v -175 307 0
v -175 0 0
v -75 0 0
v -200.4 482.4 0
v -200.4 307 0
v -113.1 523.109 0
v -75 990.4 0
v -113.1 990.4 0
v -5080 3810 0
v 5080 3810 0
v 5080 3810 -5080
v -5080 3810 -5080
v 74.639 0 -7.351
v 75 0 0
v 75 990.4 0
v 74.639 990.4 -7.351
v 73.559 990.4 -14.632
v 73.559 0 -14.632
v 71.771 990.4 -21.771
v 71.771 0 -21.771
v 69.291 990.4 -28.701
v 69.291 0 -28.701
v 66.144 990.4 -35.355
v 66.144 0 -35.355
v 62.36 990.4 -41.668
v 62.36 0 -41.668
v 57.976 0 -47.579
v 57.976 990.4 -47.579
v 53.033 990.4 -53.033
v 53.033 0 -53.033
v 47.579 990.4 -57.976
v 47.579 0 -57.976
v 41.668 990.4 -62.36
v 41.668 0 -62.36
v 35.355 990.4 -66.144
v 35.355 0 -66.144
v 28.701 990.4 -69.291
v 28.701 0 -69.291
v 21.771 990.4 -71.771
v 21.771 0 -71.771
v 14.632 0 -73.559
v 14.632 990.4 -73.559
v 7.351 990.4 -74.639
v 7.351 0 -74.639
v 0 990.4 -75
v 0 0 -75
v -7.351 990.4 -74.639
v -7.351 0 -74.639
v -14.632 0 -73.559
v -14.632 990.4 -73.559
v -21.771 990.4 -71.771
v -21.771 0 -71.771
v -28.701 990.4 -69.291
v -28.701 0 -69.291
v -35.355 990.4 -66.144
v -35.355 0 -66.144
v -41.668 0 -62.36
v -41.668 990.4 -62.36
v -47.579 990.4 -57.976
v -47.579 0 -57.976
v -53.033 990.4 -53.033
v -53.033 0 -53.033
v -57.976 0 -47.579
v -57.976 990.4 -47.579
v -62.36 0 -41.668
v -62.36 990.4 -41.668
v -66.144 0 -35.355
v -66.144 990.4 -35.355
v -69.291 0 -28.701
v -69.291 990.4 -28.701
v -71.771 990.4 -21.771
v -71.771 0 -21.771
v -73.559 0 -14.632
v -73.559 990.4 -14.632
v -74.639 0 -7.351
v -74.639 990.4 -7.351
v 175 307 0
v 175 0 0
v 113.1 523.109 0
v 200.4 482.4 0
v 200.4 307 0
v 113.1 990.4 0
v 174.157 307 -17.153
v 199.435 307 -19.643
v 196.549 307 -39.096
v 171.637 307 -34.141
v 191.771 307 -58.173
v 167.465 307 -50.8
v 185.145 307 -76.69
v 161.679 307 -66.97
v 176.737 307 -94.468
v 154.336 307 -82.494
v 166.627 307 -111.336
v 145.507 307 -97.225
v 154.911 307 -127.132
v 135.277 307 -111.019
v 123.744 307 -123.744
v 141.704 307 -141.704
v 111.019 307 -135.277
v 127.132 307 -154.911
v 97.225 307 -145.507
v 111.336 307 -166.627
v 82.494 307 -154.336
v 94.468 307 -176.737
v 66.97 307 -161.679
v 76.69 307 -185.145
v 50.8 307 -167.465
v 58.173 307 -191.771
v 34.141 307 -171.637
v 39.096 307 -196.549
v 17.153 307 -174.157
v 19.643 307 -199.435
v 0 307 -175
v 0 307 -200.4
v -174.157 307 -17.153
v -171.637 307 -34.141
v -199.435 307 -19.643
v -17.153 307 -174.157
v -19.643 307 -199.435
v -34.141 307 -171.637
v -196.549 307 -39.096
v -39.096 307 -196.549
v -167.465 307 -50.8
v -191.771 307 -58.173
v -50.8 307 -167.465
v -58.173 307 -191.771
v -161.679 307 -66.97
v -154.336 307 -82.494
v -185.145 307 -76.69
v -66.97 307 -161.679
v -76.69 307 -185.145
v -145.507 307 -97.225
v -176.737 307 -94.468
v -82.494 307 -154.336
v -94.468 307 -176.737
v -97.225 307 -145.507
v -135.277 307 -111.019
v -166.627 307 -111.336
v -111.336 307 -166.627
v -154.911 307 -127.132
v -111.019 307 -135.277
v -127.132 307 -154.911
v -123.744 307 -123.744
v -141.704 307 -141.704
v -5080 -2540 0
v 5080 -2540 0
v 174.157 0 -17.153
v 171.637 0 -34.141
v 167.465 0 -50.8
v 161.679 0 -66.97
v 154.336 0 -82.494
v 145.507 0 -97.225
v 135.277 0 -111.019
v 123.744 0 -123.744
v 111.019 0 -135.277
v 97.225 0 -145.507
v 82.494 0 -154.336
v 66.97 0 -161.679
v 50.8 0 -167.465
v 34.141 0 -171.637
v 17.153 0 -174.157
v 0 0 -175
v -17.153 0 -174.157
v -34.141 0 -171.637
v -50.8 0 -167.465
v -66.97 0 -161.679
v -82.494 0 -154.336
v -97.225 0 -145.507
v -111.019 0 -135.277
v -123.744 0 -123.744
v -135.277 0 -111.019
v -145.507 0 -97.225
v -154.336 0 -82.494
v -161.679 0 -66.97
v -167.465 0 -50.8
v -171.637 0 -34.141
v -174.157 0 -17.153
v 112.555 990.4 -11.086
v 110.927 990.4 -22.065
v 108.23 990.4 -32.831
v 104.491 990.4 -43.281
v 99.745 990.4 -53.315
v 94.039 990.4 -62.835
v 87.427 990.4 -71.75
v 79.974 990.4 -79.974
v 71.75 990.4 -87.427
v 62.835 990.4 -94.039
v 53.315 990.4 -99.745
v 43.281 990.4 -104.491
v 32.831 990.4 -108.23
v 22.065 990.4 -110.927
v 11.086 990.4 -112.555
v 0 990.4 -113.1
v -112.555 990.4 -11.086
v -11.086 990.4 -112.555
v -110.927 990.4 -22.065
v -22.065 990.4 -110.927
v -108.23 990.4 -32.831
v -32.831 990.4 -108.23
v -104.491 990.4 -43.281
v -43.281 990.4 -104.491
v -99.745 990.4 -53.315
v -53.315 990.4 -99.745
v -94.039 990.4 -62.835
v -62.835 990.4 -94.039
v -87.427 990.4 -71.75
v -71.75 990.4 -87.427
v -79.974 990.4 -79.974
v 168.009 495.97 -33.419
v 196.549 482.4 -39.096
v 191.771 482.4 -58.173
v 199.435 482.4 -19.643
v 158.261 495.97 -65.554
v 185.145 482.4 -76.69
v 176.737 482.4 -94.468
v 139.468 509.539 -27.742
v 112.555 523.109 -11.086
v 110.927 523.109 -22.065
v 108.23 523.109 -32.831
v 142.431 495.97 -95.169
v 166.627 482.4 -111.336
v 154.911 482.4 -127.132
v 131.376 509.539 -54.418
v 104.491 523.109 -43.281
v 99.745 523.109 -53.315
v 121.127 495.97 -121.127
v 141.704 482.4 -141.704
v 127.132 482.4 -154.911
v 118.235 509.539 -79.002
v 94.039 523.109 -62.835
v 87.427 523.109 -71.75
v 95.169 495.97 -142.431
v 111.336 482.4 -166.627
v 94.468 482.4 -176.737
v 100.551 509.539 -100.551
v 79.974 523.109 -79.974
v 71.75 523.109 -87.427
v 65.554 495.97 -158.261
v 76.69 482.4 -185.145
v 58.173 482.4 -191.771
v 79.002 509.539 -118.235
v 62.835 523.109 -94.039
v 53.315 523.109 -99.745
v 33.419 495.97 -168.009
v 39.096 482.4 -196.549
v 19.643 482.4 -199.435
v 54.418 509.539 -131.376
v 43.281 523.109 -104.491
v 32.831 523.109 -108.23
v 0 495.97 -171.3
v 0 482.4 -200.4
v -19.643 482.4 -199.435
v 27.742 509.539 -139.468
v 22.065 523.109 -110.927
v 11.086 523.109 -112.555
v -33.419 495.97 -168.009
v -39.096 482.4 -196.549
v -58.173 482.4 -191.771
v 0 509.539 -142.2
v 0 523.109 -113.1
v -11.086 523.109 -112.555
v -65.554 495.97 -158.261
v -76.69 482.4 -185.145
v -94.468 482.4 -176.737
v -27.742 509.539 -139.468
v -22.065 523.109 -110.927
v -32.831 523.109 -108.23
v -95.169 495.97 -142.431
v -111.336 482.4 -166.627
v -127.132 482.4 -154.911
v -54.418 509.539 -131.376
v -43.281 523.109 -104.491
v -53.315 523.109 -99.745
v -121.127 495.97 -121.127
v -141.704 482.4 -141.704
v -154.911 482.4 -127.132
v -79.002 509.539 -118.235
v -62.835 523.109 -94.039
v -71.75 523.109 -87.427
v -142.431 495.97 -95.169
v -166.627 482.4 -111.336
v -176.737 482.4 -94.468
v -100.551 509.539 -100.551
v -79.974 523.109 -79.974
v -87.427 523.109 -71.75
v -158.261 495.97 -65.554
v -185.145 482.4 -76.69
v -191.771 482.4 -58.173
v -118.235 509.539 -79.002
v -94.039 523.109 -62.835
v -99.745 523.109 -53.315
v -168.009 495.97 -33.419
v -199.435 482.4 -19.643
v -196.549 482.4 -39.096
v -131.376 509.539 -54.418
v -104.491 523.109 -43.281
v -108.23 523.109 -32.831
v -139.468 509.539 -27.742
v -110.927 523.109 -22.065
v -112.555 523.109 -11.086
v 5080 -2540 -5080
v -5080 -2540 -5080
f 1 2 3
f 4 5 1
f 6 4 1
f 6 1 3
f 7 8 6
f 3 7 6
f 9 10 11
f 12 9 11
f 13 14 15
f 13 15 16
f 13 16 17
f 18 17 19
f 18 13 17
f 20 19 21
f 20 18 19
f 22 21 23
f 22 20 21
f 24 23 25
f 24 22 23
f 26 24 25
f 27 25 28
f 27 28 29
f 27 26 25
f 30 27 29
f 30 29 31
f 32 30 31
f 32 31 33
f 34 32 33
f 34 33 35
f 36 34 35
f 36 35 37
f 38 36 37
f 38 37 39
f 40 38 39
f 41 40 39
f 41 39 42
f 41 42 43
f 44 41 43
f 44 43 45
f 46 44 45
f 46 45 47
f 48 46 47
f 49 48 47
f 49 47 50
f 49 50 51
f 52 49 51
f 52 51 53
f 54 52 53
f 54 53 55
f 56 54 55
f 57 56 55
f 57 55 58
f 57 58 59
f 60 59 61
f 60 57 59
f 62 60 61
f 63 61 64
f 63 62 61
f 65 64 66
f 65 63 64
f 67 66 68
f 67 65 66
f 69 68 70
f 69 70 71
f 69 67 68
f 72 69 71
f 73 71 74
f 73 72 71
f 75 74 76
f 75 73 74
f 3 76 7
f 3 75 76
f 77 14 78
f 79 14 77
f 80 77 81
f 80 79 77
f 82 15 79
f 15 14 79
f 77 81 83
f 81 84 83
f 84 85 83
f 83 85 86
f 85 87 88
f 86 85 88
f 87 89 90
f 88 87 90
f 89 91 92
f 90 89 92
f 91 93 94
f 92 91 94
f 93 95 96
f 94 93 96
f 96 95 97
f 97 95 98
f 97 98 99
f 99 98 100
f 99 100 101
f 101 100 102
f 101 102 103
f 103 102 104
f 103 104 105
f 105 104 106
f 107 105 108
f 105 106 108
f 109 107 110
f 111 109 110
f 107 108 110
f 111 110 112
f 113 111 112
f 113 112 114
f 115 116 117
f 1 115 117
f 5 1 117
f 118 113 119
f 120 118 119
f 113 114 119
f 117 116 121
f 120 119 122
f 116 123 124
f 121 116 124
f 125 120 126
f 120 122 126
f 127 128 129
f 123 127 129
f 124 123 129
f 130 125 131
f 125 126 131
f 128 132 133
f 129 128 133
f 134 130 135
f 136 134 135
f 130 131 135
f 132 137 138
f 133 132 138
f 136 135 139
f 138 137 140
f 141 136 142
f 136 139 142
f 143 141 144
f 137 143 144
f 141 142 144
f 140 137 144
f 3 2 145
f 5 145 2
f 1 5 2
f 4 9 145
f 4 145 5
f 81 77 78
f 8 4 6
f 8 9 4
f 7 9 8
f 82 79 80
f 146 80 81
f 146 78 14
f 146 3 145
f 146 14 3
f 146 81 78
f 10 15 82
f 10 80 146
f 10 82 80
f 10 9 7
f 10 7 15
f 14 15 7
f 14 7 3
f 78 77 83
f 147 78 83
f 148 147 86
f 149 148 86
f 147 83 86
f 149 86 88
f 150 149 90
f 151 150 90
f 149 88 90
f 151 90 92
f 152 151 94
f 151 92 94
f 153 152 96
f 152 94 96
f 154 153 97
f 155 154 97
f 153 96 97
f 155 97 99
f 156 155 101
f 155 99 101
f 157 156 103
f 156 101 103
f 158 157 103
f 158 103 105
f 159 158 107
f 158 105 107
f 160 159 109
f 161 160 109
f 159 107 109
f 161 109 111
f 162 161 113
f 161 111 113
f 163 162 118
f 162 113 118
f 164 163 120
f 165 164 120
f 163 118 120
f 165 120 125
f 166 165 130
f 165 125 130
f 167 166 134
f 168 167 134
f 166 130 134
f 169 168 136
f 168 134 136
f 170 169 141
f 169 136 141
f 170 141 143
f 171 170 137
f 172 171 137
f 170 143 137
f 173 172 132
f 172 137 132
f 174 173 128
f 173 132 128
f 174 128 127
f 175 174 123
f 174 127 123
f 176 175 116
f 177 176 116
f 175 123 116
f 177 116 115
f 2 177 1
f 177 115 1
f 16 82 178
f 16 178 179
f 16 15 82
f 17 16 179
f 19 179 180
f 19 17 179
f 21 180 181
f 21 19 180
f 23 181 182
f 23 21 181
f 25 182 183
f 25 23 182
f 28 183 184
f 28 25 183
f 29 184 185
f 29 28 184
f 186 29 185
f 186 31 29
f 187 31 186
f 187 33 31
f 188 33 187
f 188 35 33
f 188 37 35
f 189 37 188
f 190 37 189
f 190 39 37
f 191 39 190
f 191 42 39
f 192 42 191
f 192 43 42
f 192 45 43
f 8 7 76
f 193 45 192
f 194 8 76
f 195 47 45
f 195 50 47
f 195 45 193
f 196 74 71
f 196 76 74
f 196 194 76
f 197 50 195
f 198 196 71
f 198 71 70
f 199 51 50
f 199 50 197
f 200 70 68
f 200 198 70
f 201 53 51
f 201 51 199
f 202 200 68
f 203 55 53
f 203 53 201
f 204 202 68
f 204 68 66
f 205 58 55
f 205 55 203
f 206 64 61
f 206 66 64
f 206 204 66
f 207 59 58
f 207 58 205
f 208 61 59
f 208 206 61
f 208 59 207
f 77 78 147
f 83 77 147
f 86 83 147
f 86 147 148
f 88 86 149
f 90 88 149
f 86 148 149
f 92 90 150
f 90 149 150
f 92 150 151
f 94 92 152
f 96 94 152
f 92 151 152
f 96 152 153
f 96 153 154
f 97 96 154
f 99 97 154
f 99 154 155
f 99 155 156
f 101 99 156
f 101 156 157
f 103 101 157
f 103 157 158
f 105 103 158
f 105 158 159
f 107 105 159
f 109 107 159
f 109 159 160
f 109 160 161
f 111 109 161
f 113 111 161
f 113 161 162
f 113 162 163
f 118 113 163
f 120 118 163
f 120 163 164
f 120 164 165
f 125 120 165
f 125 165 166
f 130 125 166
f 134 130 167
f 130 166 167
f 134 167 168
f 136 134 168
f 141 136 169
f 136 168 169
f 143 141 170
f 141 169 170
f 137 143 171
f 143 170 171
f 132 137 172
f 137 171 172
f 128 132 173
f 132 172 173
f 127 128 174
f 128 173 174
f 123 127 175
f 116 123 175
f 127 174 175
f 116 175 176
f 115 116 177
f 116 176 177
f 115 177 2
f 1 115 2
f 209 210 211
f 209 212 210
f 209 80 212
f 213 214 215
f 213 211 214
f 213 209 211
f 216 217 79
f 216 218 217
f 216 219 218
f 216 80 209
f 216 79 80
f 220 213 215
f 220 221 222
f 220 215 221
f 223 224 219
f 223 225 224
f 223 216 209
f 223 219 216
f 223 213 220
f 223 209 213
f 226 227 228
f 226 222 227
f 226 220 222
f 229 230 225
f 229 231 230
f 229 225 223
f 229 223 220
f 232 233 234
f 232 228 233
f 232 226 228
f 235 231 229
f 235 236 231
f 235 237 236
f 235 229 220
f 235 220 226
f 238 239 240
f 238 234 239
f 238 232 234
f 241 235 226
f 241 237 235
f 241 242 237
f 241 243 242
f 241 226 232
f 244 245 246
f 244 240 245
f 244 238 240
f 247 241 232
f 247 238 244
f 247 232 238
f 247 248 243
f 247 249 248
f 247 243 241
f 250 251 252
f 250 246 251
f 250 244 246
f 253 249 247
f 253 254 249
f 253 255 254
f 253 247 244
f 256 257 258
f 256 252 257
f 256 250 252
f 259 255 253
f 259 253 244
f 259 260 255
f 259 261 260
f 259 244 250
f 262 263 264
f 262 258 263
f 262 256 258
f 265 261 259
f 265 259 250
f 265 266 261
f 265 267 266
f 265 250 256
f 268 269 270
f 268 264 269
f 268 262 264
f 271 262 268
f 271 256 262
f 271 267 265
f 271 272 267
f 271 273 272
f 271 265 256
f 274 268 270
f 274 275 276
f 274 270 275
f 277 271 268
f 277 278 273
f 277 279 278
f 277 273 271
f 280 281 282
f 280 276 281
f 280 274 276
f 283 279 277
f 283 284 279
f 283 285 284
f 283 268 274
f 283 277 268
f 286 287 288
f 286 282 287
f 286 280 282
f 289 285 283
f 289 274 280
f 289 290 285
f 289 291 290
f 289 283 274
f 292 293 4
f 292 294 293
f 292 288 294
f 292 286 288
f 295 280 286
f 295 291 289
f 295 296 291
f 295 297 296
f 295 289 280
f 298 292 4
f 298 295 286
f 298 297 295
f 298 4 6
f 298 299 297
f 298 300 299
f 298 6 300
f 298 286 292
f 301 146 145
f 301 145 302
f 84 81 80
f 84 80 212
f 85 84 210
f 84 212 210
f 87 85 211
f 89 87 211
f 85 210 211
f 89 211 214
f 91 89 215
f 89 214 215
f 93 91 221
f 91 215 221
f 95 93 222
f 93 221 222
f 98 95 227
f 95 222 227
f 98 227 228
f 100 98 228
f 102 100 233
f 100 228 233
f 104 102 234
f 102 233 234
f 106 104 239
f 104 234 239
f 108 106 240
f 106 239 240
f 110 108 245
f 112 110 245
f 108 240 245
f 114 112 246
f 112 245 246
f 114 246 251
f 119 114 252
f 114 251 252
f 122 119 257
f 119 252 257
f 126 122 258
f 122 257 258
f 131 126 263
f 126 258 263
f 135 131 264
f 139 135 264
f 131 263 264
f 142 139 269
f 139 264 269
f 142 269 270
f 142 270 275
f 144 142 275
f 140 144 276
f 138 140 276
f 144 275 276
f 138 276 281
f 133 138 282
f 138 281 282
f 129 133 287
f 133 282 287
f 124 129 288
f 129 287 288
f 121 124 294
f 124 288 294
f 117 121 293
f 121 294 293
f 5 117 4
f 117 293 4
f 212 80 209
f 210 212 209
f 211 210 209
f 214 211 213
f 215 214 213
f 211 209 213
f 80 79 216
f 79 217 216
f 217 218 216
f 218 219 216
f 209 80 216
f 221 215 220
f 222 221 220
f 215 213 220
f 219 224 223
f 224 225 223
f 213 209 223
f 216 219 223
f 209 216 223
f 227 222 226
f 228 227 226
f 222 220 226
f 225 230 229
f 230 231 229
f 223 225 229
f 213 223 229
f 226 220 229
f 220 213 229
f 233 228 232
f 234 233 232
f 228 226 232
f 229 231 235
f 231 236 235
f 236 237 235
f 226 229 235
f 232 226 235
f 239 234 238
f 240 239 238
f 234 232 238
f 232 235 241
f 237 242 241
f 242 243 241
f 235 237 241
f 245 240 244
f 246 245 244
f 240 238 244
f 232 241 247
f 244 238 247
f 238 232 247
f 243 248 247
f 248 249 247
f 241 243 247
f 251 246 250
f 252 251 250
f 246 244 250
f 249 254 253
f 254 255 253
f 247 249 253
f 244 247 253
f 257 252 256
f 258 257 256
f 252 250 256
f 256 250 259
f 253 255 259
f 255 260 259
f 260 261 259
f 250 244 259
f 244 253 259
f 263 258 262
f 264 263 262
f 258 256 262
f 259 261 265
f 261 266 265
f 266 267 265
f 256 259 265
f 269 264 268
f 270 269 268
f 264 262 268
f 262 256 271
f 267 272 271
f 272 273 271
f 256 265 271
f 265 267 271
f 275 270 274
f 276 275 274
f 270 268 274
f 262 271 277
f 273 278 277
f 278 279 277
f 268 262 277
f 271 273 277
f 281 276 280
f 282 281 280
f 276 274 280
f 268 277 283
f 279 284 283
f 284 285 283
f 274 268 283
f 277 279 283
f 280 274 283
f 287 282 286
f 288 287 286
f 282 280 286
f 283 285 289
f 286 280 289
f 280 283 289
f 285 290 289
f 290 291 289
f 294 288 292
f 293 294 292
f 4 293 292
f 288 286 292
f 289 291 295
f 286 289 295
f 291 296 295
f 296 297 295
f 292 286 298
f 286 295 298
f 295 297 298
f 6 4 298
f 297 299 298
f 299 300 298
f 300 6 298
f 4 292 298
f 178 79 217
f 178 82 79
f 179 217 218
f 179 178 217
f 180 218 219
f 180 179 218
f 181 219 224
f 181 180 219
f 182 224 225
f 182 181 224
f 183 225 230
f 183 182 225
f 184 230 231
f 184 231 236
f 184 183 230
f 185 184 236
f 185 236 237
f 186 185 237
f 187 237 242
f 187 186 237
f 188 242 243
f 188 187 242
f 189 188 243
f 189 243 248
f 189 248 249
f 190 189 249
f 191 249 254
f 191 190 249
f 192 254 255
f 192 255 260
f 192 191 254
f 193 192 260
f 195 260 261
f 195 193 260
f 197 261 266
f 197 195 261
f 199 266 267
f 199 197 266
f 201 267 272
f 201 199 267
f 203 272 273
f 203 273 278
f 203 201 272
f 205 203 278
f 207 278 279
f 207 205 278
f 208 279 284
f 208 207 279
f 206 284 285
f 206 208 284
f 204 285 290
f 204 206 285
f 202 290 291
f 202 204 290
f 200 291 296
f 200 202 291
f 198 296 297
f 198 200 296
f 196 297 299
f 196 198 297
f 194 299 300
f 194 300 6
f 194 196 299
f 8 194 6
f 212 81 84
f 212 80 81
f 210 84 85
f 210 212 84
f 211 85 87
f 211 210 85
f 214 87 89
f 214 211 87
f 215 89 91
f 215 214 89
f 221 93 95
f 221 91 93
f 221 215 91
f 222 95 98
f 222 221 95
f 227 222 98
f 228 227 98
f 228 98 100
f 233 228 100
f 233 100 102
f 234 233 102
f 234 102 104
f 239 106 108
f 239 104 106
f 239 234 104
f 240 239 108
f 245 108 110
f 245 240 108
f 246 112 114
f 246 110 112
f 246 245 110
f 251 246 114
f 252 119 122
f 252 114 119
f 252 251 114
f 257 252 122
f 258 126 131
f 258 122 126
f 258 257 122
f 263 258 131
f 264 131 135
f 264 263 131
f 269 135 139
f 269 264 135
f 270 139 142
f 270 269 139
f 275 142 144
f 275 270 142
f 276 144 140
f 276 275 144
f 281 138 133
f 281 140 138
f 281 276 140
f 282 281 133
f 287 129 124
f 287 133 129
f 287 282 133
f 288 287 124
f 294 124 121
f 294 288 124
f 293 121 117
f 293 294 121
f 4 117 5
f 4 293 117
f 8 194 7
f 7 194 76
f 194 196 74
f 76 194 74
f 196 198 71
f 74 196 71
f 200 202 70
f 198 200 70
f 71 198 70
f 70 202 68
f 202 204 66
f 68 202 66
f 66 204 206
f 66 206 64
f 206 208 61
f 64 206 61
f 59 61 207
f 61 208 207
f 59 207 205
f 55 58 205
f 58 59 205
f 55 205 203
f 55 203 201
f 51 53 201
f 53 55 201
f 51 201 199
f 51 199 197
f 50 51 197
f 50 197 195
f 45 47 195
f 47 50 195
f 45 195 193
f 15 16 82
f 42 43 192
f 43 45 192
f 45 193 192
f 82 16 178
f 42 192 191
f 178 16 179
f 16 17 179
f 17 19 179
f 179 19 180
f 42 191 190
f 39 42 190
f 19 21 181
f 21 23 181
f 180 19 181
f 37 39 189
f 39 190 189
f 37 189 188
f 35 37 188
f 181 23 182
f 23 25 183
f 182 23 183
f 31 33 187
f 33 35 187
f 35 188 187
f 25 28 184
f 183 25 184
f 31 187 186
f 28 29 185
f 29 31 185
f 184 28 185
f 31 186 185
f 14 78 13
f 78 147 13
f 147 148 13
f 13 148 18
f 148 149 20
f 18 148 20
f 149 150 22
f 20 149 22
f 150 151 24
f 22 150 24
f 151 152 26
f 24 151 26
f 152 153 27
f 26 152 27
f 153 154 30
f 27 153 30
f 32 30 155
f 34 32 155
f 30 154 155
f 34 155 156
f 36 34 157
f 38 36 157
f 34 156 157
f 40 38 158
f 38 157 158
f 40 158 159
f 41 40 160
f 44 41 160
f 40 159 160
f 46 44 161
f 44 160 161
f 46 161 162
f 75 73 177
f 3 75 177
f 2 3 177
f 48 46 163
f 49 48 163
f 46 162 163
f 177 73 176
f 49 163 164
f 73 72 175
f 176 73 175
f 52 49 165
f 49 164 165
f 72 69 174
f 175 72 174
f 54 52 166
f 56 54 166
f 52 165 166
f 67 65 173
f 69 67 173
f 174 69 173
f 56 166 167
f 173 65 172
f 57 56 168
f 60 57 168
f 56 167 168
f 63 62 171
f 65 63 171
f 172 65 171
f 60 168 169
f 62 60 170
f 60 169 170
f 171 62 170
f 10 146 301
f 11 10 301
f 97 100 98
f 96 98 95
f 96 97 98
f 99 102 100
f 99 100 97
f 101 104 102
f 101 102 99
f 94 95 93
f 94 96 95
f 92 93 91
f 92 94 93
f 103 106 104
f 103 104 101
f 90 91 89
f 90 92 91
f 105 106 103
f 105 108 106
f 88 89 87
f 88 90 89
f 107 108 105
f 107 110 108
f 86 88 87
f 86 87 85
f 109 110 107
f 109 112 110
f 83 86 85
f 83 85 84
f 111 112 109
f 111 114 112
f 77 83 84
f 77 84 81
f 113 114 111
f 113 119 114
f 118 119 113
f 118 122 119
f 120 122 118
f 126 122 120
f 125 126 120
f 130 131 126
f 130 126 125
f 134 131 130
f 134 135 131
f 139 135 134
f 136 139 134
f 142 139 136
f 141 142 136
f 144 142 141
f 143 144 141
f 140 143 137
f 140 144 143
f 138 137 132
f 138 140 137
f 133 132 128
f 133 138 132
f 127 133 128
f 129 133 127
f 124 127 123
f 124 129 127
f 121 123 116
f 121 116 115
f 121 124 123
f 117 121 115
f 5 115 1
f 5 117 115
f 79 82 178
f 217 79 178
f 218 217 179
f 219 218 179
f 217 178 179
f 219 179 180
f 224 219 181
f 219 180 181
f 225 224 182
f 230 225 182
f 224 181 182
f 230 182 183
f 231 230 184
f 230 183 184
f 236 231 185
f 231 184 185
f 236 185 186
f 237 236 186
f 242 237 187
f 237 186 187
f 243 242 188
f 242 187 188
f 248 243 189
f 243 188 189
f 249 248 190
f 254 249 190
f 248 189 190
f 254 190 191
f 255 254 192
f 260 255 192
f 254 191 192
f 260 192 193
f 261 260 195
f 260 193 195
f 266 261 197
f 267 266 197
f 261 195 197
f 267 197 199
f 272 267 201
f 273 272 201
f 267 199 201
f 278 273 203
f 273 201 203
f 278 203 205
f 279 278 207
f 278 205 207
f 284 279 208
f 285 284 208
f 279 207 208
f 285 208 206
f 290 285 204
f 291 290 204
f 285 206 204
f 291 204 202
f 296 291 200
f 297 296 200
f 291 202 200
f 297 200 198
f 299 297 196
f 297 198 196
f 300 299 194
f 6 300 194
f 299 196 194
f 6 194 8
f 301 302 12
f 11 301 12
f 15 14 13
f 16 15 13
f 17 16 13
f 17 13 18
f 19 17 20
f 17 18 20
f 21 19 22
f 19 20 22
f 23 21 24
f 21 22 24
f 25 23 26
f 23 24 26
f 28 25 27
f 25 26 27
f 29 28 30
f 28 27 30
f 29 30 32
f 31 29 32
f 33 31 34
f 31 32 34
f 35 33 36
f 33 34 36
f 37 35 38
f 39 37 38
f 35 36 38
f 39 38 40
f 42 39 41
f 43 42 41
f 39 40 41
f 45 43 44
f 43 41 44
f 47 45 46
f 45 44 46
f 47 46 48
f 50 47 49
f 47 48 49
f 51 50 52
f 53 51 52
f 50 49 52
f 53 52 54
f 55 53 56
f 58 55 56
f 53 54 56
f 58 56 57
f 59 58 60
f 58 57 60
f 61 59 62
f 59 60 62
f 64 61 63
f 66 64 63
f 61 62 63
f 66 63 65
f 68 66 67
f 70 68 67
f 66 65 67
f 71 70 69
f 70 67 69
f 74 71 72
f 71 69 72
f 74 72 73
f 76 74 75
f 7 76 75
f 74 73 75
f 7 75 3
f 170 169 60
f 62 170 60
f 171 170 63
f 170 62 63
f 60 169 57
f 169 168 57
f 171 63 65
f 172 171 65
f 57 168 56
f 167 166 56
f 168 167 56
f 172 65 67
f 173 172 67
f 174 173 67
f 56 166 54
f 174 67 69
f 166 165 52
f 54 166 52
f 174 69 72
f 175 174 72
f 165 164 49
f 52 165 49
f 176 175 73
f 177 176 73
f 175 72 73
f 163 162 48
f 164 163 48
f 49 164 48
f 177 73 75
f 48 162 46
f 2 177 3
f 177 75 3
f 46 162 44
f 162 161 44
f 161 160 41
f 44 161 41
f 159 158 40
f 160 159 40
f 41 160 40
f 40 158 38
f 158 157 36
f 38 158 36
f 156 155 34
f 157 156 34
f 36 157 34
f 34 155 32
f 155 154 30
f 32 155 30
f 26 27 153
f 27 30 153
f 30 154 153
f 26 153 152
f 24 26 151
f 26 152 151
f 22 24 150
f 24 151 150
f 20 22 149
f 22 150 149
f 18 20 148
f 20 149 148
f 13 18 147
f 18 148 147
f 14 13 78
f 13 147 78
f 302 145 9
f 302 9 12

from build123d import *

# Parameters (mm, degrees)
SKETCH1_R           = 175
SKETCH1_R_2         = 75
BOSS_EXTRUDE1_DEPTH = 457
SKETCH3_W           = 10160
SKETCH3_H           = 6350
BOSS_EXTRUDE2_DEPTH = 5080
SKETCH4_W           = 13475.768327993
SKETCH4_H           = 8367.586519284
CUT_EXTRUDE1_DEPTH  = 8132.96778154


# Read off the part's stored shape, not the designer's step: Intersect1
with BuildPart() as part:
    # Sketch1 → Boss-Extrude1 (new body)
    with BuildSketch(Plane(origin=(0, 0, 0), x_dir=(1, 0, 0), z_dir=(0, 1, 0))):
        with Locations(Location((0, 0, 0), (0, 0, 270))):
            Circle(SKETCH1_R)
        with Locations(Location((0, 0, 0), (0, 0, 270))):
            Circle(SKETCH1_R_2, mode=Mode.SUBTRACT)
    extrude(amount=BOSS_EXTRUDE1_DEPTH)

    # Sketch2 → Revolve1 (revolve)
    with BuildSketch(Plane.XY, mode=Mode.PRIVATE) as revolve1_sk:
        Polygon((-175, 307), (-200.4, 307), (-200.4, 482.4), (-113.1, 523.108658557), (-113.1, 990.4), (-75, 990.4), (-75, 533.2), (-75, 457), (-175, 457), align=None)
    revolve(revolve1_sk.sketch.rotate(Axis((0, 0, 0), (0, 1, 0)), 270), axis=Axis((0, 0, 0), (0, 1, 0)))


with BuildPart() as body_2:
    # Sketch3 → Boss-Extrude2 (new, symmetric)
    with BuildSketch(Plane(origin=(0, 0, 0), x_dir=(0, 0, -1), z_dir=(1, 0, 0))):
        with Locations((0, 635)):
            Rectangle(SKETCH3_W, SKETCH3_H)
    extrude(amount=BOSS_EXTRUDE2_DEPTH, both=True)

    # Intersect1 outline → Intersect1 (revolve, cut)
    with BuildSketch(Plane.XY):
        Polygon((113.1, 990.4), (75, 990.4), (75, 0), (175, 0), (175, 307), (200.4, 307), (200.4, 482.4), (113.1, 523.108658557), align=None)
    revolve(axis=Axis((0, 0, 0), (0, 1, 0)), mode=Mode.SUBTRACT)


with BuildPart() as cut_extrude1_tool:
    # Sketch4 → Cut-Extrude1 (new, through all)
    with BuildSketch(Plane.XY):
        with Locations((454.179344916, 464.014834855)):
            Rectangle(SKETCH4_W, SKETCH4_H)
    extrude(amount=CUT_EXTRUDE1_DEPTH)


with BuildPart() as part_1:
    add(part.part)

    # Cut-Extrude1: cut by cut_extrude1_tool
    add(cut_extrude1_tool.part, mode=Mode.SUBTRACT)


with BuildPart() as body_2_1:
    add(body_2.part)

    # Cut-Extrude1: cut by cut_extrude1_tool
    add(cut_extrude1_tool.part, mode=Mode.SUBTRACT)


solid = Compound([part_1.part, body_2_1.part])
